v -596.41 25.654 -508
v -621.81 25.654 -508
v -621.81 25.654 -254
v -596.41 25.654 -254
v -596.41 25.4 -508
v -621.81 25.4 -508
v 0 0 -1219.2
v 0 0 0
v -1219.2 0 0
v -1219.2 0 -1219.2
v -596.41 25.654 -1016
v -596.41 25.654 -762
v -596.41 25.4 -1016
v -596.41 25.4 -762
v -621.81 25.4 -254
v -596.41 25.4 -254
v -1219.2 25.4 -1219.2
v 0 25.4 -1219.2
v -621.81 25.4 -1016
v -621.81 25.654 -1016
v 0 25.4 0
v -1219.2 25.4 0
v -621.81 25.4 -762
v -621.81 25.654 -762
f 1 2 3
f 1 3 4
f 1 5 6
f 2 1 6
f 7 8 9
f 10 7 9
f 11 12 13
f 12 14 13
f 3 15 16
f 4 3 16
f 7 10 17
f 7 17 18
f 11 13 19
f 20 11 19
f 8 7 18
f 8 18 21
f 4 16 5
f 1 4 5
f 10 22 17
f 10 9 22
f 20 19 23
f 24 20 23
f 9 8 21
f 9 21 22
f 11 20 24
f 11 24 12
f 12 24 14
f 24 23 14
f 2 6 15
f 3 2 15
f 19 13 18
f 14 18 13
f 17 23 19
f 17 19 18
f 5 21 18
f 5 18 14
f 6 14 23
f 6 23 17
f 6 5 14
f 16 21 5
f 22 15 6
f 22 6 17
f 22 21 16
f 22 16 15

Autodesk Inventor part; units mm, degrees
ref_plane "YZ Plane" through (0, 0, 0) normal (1, 0, 0) x (0, 1, 0)
ref_plane "XZ Plane" through (0, 0, 0) normal (0, 1, 0) x (-1, 0, 0)
ref_plane "XY Plane" through (0, 0, 0) normal (0, 0, 1) x (1, 0, 0)
sketch "Sketch1" plane through (0, 0, 0) normal (0, 1, 0) x (-1, 0, 0)
  line L0 (0, 0) -> (1219.2, 0)
  line L1 (1219.2, 0) -> (1219.2, -1219.2)
  line L2 (1219.2, -1219.2) -> (0, -1219.2)
  line L3 (0, -1219.2) -> (0, 0)
  dimension "d0" = 1219.2
  dimension "d1" = 1219.2
extrude "Extrusion1" add sketch "Sketch1" along normal blind 25.4
sketch "Sketch2" plane through (0, 25.4, 0) normal (0, 1, 0) x (1, 0, 0)
  line L0 (-609.6, -1656.7277) -> (-609.6, 2305.4787) construction
  line L1 (-1219.2, 1219.2) -> (-1219.2, 0) projected
  line L2 (-621.8103, 254) -> (-596.4103, 254)
  line L3 (-596.4103, 254) -> (-596.4103, 508)
  line L4 (-596.4103, 508) -> (-621.8103, 508)
  line L5 (-621.8103, 508) -> (-621.8103, 254)
  line L6 (-1219.2, 0) -> (0, 0) projected
  line L7 (-621.8103, 762) -> (-596.4103, 762)
  line L8 (-596.4103, 762) -> (-596.4103, 1016)
  line L9 (-596.4103, 1016) -> (-621.8103, 1016)
  line L10 (-621.8103, 1016) -> (-621.8103, 762)
  dimension "d4" = 609.6
  dimension "d5" = 25.4
  dimension "d6" = 254
  dimension "d7" = 254
  dimension "d10" = 508
extrude "Extrusion2" add sketch "Sketch2" along normal blind 0.254
properties part number "road_empty"
